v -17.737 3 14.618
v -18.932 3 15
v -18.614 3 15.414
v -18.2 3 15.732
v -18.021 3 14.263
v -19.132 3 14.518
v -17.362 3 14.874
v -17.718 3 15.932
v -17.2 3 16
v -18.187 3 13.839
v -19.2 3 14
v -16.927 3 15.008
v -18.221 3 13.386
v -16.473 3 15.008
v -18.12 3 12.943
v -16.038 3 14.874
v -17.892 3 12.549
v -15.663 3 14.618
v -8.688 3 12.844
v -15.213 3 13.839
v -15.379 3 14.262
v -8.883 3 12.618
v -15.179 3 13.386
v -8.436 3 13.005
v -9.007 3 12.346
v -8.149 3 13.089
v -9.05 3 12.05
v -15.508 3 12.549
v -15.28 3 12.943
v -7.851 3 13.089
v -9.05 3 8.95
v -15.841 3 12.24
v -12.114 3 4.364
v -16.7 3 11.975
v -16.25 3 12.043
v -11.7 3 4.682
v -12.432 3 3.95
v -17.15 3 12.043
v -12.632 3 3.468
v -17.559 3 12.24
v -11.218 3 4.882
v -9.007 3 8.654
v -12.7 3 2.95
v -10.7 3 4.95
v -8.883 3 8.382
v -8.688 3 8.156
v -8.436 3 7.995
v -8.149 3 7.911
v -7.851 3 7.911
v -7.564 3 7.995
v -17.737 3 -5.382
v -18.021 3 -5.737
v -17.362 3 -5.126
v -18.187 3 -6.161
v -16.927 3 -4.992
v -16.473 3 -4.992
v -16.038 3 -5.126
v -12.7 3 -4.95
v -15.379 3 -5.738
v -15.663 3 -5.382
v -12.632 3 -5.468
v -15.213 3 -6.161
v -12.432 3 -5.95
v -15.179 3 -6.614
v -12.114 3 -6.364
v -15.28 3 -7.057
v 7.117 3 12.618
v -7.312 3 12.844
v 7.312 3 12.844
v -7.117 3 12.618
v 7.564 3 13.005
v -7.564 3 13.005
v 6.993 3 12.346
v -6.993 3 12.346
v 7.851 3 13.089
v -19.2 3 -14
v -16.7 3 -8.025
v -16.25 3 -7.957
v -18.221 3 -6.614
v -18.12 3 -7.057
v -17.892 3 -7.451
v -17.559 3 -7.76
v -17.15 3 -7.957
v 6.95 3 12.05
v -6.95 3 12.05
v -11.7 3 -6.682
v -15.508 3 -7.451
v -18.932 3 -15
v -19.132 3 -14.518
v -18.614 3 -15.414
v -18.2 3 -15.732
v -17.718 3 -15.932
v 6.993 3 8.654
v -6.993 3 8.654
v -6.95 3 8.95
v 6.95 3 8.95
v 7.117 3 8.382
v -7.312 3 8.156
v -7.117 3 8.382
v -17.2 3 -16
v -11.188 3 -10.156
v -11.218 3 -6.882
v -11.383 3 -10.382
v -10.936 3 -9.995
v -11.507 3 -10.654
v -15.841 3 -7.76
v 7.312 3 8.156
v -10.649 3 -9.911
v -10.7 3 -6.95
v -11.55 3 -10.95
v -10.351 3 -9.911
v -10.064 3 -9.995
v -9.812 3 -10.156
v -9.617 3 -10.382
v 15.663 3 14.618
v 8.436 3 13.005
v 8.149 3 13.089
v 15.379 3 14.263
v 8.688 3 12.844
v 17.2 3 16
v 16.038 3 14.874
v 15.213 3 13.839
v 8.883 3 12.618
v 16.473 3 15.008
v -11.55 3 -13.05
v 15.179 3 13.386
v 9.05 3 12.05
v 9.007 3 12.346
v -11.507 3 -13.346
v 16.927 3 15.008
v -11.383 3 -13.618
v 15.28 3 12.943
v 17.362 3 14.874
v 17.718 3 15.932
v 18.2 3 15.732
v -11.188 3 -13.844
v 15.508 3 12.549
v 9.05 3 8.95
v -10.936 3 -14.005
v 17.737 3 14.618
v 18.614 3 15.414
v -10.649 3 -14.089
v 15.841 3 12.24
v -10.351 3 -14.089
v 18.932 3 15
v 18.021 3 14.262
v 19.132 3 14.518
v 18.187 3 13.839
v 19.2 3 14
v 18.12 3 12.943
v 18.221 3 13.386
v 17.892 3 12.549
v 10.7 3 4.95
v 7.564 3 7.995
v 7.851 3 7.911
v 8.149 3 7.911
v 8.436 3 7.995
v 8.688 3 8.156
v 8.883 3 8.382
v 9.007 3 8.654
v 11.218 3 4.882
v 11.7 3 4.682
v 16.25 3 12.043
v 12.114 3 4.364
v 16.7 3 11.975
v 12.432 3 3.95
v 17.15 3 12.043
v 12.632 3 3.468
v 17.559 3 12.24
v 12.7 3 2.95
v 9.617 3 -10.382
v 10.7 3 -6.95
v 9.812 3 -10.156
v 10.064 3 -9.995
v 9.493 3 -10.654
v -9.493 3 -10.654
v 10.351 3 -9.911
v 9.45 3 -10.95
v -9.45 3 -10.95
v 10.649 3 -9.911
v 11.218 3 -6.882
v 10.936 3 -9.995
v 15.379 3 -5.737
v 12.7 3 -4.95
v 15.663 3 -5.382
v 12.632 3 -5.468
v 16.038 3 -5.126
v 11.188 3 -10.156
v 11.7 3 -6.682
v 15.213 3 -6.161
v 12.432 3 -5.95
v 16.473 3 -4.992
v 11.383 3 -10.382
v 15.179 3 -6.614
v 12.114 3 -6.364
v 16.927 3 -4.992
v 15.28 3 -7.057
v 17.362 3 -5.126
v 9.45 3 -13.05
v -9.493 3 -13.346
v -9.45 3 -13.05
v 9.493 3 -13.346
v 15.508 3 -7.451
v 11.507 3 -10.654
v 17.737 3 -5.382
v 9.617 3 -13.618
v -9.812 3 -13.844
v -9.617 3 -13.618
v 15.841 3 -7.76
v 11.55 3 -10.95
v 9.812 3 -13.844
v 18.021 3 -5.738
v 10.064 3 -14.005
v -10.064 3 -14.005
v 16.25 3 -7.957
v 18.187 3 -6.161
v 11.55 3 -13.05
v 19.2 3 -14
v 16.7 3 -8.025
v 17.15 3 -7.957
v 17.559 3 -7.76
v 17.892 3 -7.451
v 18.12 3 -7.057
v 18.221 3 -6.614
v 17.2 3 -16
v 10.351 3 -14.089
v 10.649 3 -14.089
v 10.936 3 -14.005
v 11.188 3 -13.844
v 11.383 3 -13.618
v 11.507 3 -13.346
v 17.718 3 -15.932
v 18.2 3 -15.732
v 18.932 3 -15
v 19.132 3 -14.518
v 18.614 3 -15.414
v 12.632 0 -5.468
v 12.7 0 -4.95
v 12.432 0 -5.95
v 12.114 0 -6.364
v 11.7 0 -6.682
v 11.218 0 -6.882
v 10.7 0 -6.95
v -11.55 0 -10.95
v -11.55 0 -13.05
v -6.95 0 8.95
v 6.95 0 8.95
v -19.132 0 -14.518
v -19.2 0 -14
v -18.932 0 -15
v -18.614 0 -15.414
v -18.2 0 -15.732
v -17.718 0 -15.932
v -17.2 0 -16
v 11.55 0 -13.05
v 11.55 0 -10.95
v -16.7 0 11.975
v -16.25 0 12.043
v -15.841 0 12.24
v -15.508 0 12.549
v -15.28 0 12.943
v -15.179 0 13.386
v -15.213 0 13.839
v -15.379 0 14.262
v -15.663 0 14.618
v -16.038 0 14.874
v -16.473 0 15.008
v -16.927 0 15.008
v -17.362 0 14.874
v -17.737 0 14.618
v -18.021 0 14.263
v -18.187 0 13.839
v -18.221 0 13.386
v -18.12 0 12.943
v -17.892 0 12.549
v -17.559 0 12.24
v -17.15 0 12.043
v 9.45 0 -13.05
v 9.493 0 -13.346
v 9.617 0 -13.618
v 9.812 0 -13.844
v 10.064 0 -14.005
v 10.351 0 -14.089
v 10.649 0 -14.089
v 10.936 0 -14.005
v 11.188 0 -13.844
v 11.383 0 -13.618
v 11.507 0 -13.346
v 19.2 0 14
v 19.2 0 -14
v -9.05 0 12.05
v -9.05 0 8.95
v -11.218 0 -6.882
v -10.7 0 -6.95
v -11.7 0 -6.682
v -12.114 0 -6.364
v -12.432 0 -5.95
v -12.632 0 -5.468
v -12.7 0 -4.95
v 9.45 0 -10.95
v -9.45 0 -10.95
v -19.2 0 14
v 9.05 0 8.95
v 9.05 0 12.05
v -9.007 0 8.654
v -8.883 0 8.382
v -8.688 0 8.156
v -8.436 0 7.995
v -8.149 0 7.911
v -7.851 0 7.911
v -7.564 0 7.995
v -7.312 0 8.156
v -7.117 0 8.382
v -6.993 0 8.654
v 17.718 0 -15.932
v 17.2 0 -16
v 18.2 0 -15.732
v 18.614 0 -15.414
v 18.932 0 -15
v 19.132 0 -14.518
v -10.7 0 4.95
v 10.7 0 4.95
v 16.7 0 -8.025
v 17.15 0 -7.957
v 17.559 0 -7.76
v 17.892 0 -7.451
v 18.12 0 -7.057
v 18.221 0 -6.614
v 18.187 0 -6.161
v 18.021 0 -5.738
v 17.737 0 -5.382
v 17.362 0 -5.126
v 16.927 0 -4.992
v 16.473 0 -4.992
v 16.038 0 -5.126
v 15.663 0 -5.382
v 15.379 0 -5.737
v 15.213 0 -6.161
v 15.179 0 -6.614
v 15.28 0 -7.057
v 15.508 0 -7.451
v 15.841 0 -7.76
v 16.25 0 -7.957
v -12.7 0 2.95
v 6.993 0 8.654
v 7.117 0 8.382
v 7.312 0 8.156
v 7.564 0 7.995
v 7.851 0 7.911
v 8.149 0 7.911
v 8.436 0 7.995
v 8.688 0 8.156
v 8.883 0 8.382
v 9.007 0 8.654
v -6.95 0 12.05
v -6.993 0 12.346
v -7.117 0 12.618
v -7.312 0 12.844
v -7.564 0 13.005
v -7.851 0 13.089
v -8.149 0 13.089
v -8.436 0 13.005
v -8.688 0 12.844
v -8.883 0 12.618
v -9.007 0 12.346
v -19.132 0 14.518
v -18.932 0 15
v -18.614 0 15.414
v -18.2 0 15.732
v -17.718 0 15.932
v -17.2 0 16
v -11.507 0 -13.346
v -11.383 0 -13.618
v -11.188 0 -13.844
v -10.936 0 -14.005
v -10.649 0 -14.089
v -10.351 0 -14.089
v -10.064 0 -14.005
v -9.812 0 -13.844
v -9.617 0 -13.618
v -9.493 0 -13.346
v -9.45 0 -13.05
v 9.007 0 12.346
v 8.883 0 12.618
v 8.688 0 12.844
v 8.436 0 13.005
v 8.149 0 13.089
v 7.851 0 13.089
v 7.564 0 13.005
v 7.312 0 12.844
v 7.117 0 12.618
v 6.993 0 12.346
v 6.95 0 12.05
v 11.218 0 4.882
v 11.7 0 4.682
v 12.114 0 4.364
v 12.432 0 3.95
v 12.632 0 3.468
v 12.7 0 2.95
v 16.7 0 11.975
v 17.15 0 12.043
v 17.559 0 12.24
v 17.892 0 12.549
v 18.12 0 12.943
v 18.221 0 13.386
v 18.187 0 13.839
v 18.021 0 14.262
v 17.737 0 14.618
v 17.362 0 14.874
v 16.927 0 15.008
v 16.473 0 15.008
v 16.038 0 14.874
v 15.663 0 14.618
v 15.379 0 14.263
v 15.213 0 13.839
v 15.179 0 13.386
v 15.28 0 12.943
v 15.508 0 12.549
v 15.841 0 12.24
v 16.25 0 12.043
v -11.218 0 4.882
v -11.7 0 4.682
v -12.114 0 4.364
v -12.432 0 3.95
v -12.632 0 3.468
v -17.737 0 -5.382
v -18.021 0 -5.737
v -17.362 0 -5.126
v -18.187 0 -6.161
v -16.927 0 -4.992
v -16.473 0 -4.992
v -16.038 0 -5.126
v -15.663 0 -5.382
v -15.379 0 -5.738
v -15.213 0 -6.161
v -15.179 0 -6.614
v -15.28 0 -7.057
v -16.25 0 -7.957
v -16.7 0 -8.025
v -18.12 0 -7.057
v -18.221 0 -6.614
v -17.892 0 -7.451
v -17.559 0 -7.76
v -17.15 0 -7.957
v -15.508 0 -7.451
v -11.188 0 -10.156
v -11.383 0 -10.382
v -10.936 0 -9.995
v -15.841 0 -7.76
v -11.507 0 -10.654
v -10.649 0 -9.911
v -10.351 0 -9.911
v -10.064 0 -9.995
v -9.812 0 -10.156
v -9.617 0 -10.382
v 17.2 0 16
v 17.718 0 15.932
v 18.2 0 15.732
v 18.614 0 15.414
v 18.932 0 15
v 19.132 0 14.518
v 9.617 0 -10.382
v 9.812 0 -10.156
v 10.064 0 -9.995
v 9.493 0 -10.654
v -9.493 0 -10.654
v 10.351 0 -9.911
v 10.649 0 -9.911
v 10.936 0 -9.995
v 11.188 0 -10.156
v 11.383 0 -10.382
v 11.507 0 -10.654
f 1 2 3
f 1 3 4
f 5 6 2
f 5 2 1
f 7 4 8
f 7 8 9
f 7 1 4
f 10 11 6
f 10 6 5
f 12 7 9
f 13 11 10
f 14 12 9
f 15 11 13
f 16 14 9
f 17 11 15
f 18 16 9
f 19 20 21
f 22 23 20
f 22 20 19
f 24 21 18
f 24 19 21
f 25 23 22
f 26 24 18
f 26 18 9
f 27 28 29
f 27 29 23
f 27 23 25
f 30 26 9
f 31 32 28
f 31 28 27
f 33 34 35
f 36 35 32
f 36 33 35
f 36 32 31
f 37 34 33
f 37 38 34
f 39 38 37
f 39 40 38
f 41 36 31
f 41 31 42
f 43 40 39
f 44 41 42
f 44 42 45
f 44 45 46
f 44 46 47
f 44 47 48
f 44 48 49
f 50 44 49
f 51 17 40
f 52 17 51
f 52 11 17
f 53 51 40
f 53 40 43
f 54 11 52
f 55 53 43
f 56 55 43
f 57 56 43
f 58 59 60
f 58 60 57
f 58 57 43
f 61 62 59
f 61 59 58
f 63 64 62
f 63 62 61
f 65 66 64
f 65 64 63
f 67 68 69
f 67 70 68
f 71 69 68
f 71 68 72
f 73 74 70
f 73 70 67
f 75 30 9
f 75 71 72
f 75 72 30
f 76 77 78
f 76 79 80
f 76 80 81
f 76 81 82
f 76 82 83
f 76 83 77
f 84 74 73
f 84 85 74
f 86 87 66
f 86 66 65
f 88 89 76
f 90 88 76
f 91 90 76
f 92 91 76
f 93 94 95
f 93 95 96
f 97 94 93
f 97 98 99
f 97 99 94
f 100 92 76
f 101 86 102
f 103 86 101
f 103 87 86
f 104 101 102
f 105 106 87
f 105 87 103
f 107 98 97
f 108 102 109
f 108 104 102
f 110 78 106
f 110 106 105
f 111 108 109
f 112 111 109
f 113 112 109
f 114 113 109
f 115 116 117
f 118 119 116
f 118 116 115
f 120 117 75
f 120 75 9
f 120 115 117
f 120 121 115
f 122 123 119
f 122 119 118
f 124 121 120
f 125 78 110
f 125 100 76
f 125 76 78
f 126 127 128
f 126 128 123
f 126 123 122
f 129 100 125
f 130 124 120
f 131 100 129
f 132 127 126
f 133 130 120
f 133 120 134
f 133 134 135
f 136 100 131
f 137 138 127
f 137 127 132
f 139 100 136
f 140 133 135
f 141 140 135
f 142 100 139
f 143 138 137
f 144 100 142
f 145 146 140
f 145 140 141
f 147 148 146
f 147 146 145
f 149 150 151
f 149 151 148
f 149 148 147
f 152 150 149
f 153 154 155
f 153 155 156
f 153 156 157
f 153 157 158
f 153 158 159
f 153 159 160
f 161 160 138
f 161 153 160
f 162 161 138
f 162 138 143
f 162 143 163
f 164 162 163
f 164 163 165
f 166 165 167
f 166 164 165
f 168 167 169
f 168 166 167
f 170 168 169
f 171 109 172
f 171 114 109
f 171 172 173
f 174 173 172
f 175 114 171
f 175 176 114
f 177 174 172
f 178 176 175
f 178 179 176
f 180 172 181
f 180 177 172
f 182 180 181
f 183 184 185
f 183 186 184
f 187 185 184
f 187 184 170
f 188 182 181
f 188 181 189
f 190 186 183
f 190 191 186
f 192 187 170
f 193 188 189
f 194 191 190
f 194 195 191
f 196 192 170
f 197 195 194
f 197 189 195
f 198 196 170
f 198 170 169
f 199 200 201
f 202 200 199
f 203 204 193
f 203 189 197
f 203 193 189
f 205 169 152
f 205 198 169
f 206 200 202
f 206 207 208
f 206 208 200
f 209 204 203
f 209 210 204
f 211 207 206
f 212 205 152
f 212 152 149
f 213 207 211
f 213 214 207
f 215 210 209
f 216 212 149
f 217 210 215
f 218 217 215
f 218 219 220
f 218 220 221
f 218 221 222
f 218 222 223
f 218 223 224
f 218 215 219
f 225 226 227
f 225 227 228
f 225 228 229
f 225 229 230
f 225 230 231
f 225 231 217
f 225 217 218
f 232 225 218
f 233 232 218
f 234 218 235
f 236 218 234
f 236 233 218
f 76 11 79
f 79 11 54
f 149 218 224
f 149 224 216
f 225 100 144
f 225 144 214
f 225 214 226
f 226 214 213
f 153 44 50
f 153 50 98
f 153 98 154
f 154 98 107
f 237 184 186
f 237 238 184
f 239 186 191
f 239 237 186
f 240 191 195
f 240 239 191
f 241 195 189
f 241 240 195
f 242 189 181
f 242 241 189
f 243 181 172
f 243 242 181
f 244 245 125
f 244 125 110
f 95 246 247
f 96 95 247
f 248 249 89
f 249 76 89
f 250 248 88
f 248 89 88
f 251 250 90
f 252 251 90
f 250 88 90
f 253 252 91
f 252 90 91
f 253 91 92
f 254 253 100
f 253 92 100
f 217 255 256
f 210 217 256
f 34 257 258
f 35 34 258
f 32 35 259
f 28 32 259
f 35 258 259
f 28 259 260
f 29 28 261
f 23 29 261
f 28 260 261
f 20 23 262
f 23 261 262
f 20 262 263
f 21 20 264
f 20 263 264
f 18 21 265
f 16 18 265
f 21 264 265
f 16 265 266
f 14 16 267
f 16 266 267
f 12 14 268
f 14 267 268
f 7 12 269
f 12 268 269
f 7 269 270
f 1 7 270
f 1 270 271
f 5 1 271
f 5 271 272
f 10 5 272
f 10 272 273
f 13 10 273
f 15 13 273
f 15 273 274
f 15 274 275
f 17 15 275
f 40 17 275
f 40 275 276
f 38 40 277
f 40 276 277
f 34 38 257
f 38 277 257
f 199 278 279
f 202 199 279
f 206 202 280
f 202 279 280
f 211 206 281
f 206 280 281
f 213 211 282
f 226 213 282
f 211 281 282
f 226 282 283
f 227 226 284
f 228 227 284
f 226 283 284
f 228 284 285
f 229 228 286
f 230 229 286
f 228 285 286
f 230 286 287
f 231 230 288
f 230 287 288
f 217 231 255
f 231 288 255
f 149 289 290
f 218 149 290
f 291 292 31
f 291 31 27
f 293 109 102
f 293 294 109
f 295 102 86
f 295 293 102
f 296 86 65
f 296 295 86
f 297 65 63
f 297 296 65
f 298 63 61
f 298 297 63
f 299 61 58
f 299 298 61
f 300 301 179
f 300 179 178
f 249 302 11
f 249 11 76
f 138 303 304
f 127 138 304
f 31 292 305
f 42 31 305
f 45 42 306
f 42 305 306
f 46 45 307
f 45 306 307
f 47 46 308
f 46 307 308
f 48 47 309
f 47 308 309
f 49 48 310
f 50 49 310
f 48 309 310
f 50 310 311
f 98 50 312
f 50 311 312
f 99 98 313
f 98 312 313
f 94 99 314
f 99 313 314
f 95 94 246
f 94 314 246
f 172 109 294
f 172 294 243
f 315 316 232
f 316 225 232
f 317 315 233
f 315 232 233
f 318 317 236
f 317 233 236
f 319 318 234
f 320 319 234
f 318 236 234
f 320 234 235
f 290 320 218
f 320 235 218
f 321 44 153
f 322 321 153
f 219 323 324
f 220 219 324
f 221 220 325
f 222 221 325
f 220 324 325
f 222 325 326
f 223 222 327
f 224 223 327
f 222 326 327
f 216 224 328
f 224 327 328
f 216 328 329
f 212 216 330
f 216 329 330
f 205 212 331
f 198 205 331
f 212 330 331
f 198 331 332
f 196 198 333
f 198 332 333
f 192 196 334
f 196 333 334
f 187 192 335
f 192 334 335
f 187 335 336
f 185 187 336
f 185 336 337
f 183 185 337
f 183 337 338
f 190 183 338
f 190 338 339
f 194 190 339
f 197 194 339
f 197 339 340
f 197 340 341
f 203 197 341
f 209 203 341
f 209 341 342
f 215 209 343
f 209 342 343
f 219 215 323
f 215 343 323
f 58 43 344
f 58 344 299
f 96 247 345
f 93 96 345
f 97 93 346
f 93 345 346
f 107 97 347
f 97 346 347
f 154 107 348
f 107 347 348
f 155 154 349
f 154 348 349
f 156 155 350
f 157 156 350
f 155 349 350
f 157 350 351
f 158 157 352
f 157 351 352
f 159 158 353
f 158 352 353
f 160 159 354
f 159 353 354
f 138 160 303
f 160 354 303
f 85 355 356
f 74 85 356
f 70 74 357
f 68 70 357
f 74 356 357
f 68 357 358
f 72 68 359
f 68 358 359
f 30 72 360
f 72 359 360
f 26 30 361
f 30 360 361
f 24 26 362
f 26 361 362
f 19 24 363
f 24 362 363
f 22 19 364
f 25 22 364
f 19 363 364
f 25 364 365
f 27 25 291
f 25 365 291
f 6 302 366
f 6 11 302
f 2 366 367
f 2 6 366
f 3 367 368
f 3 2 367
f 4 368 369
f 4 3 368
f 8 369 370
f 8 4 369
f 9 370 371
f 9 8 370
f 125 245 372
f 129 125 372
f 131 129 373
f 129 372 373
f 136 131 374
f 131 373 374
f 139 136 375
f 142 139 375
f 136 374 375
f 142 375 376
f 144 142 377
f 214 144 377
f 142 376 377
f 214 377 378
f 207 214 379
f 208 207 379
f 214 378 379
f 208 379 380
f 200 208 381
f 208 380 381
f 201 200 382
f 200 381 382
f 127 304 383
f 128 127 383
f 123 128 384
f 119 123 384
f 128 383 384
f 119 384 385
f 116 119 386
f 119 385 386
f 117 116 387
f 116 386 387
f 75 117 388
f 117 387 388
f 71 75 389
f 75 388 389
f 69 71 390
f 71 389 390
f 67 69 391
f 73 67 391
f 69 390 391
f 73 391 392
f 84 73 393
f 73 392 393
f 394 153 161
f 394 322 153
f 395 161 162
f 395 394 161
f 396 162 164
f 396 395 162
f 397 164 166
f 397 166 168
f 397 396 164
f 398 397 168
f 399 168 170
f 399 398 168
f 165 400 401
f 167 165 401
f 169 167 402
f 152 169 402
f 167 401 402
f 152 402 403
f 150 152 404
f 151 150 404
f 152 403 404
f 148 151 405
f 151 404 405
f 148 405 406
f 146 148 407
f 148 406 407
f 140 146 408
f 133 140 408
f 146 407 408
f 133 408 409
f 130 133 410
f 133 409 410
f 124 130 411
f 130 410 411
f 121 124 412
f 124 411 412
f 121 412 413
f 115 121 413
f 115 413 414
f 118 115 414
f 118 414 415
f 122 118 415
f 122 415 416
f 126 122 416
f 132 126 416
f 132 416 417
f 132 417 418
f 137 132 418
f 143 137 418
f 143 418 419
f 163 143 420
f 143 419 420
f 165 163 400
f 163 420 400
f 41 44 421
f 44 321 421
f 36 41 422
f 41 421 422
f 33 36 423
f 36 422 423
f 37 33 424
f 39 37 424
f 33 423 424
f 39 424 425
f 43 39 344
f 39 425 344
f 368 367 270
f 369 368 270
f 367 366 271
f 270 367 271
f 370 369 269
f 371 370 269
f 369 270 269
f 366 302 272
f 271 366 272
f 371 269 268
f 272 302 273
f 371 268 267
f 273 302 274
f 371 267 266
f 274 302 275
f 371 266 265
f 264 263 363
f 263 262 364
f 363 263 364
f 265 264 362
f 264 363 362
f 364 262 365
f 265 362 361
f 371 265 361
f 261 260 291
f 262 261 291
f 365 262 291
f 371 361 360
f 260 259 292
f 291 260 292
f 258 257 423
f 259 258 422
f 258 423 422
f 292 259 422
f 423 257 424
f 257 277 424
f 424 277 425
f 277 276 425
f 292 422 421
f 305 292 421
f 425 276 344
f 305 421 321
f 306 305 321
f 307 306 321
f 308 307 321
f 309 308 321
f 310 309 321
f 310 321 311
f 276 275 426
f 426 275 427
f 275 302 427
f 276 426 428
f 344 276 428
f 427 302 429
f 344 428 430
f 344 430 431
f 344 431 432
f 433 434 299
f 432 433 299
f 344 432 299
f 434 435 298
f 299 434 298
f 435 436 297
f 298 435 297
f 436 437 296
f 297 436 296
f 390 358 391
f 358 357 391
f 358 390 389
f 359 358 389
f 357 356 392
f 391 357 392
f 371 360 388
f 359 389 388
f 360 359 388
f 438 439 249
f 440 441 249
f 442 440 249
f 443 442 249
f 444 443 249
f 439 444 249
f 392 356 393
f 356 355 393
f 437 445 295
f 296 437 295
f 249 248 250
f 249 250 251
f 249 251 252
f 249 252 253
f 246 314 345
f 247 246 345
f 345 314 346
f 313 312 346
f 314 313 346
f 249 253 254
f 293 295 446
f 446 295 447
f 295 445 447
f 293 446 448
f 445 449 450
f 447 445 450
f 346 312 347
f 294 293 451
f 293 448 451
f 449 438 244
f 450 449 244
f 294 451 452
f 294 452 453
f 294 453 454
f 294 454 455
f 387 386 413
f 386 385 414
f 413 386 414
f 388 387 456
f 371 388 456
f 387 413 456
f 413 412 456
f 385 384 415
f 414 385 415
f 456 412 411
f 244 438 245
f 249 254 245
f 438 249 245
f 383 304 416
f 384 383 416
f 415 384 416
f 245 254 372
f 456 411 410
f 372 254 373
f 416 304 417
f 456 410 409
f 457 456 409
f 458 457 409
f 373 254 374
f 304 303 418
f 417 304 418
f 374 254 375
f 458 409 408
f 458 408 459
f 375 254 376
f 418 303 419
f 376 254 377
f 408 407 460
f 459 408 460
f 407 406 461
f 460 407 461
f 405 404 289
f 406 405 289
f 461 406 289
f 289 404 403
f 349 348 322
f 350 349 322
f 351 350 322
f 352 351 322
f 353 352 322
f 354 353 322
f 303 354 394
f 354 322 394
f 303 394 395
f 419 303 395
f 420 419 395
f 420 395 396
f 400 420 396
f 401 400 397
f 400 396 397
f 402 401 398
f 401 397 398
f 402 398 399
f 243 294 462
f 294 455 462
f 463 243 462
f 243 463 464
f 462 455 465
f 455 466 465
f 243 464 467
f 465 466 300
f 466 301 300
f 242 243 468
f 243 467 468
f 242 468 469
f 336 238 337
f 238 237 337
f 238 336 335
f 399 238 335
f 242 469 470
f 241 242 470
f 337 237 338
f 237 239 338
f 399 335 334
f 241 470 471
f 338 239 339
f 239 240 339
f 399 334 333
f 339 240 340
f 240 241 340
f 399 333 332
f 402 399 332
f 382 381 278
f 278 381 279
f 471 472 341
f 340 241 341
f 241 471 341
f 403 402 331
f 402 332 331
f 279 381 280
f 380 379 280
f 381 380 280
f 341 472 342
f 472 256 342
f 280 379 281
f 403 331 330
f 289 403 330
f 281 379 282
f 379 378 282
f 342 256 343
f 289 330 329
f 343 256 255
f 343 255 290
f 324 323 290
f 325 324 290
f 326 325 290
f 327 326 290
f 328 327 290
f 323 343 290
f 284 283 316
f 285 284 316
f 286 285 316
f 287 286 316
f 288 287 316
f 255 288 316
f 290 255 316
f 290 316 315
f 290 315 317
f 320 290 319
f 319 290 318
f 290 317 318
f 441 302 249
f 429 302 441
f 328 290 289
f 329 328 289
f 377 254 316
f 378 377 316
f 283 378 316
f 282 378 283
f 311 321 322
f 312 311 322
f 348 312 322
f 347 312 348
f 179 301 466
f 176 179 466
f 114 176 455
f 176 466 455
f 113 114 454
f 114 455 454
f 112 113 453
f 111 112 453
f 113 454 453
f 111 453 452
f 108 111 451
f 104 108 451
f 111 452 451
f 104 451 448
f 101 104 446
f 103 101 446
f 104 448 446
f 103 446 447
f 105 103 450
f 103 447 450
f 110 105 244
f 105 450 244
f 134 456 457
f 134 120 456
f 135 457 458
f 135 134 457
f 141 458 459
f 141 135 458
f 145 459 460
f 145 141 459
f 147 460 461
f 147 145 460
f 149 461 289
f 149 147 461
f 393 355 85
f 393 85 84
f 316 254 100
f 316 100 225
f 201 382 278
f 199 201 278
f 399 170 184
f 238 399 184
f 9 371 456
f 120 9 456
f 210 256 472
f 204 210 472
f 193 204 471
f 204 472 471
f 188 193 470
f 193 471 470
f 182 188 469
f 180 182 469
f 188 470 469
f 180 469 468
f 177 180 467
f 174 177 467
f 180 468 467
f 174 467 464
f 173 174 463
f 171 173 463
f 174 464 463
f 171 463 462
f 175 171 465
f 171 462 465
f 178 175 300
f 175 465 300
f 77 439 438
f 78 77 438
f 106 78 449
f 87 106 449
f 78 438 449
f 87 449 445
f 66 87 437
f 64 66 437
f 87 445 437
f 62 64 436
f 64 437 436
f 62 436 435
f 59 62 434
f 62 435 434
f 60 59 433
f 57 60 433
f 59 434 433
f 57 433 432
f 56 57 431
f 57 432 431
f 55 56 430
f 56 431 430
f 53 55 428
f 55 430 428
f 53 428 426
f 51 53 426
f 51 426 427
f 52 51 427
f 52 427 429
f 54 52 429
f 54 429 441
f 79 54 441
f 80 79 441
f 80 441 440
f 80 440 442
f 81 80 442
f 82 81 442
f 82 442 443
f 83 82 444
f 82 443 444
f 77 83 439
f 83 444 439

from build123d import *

# Parameters (mm, degrees)
SKETCH_1_W          = 38.4
SKETCH_1_H          = 32
EXTRUDE_1_DEPTH     = 3
SKETCH_2_R          = 1.525
CUT_EXTRUDE_1_DEPTH = 3
SKETCH_3_W          = 23.1
SKETCH_3_H          = 2.1
CUT_EXTRUDE_2_DEPTH = 3
CUT_EXTRUDE_3_DEPTH = 3
SKETCH_5_W          = 18.1
SKETCH_5_H          = 3.1
CUT_EXTRUDE_4_DEPTH = 3
SKETCH_6_R          = 1.05
CUT_EXTRUDE_5_DEPTH = 3
SKETCH_7_W          = 25.4
SKETCH_7_H          = 11.9
CUT_EXTRUDE_6_DEPTH = 3
FILLET_1_R          = 2
FILLET_2_R          = 2


with BuildPart() as part:
    # 草图1 → 凸台-拉伸1 (new body)
    with BuildSketch(Plane(origin=(0, 0, 0), x_dir=(1, 0, 0), z_dir=(0, 1, 0))):
        Rectangle(SKETCH_1_W, SKETCH_1_H)
    extrude(amount=EXTRUDE_1_DEPTH)

    # 草图2 → 切除-拉伸1 (cut)
    with BuildSketch(Plane.XZ):
        with Locations(Location((-16.7, 13.5, 0), (0, 0, 270))):
            Circle(SKETCH_2_R)
        with Locations(Location((16.7, 13.5, 0), (0, 0, 270))):
            Circle(SKETCH_2_R)
        with Locations(Location((-16.7, -6.5, 0), (0, 0, 270))):
            Circle(SKETCH_2_R)
        with Locations(Location((16.7, -6.5, 0), (0, 0, 270))):
            Circle(SKETCH_2_R)
    extrude(amount=-CUT_EXTRUDE_1_DEPTH, mode=Mode.SUBTRACT)

    # 草图3 → 切除-拉伸2 (cut)
    with BuildSketch(Plane.XZ):
        with Locations((0, -12)):
            Rectangle(SKETCH_3_W, SKETCH_3_H)
    extrude(amount=-CUT_EXTRUDE_2_DEPTH, mode=Mode.SUBTRACT)

    # 草图4 → 切除-拉伸3 (cut)
    with BuildSketch(Plane.XZ):
        with BuildLine():
            ThreePointArc((-9.45, -13.05), (-9.75753788, -12.30753788), (-10.5, -12))
            ThreePointArc((-10.5, -12), (-11.24246212, -12.30753788), (-11.55, -13.05))
            Line((-11.55, -13.05), (-9.45, -13.05))
        make_face()
        with BuildLine():
            ThreePointArc((-11.55, -13.05), (-10.5, -14.1), (-9.45, -13.05))
            Line((-9.45, -13.05), (-11.55, -13.05))
        make_face()
        with BuildLine():
            Line((-11.55, -10.95), (-9.45, -10.95))
            ThreePointArc((-9.45, -10.95), (-10.5, -9.9), (-11.55, -10.95))
        make_face()
        with BuildLine():
            ThreePointArc((-10.5, -12), (-9.75753788, -11.69246212), (-9.45, -10.95))
            Line((-9.45, -10.95), (-11.55, -10.95))
            ThreePointArc((-11.55, -10.95), (-11.24246212, -11.69246212), (-10.5, -12))
        make_face()
        with BuildLine():
            Line((9.45, -10.95), (11.55, -10.95))
            ThreePointArc((11.55, -10.95), (10.5, -9.9), (9.45, -10.95))
        make_face()
        with BuildLine():
            ThreePointArc((10.5, -12), (11.24246212, -11.69246212), (11.55, -10.95))
            Line((11.55, -10.95), (9.45, -10.95))
            ThreePointArc((9.45, -10.95), (9.75753788, -11.69246212), (10.5, -12))
        make_face()
        with BuildLine():
            ThreePointArc((11.55, -13.05), (11.24246212, -12.30753788), (10.5, -12))
            ThreePointArc((10.5, -12), (9.75753788, -12.30753788), (9.45, -13.05))
            Line((9.45, -13.05), (11.55, -13.05))
        make_face()
        with BuildLine():
            ThreePointArc((9.45, -13.05), (10.5, -14.1), (11.55, -13.05))
            Line((11.55, -13.05), (9.45, -13.05))
        make_face()
    extrude(amount=-CUT_EXTRUDE_3_DEPTH, mode=Mode.SUBTRACT)

    # 草图5 → 切除-拉伸4 (cut)
    with BuildSketch(Plane.XZ):
        with Locations((0, 10.5)):
            Rectangle(SKETCH_5_W, SKETCH_5_H)
    extrude(amount=-CUT_EXTRUDE_4_DEPTH, mode=Mode.SUBTRACT)

    # 草图6 → 切除-拉伸5 (cut)
    with BuildSketch(Plane.XZ):
        with Locations((-8, 8.95)):
            Circle(SKETCH_6_R)
        with Locations((-8, 12.05)):
            Circle(SKETCH_6_R)
        with Locations((8, 12.05)):
            Circle(SKETCH_6_R)
        with Locations((8, 8.95)):
            Circle(SKETCH_6_R)
    extrude(amount=-CUT_EXTRUDE_5_DEPTH, mode=Mode.SUBTRACT)

    # 草图7 → 切除-拉伸6 (cut)
    with BuildSketch(Plane(origin=(0, 3, 0), x_dir=(1, 0, 0), z_dir=(0, 1, 0))):
        with Locations((0, 1)):
            Rectangle(SKETCH_7_W, SKETCH_7_H)
    extrude(amount=-CUT_EXTRUDE_6_DEPTH, mode=Mode.SUBTRACT)

    # 圆角1
    fillet_1_edges = [part.edges().sort_by_distance(p)[0] for p in [
        (-12.7, 1.5, -6.95),
        (-12.7, 1.5, 4.95),
        (12.7, 1.5, 4.95),
        (12.7, 1.5, -6.95),
    ]]
    fillet(fillet_1_edges, radius=FILLET_1_R)

    # 圆角2
    fillet_2_edges = [part.edges().sort_by_distance(p)[0] for p in [
        (19.2, 1.5, 16),
        (-19.2, 1.5, 16),
        (-19.2, 1.5, -16),
        (19.2, 1.5, -16),
    ]]
    fillet(fillet_2_edges, radius=FILLET_2_R)


solid = part.part
